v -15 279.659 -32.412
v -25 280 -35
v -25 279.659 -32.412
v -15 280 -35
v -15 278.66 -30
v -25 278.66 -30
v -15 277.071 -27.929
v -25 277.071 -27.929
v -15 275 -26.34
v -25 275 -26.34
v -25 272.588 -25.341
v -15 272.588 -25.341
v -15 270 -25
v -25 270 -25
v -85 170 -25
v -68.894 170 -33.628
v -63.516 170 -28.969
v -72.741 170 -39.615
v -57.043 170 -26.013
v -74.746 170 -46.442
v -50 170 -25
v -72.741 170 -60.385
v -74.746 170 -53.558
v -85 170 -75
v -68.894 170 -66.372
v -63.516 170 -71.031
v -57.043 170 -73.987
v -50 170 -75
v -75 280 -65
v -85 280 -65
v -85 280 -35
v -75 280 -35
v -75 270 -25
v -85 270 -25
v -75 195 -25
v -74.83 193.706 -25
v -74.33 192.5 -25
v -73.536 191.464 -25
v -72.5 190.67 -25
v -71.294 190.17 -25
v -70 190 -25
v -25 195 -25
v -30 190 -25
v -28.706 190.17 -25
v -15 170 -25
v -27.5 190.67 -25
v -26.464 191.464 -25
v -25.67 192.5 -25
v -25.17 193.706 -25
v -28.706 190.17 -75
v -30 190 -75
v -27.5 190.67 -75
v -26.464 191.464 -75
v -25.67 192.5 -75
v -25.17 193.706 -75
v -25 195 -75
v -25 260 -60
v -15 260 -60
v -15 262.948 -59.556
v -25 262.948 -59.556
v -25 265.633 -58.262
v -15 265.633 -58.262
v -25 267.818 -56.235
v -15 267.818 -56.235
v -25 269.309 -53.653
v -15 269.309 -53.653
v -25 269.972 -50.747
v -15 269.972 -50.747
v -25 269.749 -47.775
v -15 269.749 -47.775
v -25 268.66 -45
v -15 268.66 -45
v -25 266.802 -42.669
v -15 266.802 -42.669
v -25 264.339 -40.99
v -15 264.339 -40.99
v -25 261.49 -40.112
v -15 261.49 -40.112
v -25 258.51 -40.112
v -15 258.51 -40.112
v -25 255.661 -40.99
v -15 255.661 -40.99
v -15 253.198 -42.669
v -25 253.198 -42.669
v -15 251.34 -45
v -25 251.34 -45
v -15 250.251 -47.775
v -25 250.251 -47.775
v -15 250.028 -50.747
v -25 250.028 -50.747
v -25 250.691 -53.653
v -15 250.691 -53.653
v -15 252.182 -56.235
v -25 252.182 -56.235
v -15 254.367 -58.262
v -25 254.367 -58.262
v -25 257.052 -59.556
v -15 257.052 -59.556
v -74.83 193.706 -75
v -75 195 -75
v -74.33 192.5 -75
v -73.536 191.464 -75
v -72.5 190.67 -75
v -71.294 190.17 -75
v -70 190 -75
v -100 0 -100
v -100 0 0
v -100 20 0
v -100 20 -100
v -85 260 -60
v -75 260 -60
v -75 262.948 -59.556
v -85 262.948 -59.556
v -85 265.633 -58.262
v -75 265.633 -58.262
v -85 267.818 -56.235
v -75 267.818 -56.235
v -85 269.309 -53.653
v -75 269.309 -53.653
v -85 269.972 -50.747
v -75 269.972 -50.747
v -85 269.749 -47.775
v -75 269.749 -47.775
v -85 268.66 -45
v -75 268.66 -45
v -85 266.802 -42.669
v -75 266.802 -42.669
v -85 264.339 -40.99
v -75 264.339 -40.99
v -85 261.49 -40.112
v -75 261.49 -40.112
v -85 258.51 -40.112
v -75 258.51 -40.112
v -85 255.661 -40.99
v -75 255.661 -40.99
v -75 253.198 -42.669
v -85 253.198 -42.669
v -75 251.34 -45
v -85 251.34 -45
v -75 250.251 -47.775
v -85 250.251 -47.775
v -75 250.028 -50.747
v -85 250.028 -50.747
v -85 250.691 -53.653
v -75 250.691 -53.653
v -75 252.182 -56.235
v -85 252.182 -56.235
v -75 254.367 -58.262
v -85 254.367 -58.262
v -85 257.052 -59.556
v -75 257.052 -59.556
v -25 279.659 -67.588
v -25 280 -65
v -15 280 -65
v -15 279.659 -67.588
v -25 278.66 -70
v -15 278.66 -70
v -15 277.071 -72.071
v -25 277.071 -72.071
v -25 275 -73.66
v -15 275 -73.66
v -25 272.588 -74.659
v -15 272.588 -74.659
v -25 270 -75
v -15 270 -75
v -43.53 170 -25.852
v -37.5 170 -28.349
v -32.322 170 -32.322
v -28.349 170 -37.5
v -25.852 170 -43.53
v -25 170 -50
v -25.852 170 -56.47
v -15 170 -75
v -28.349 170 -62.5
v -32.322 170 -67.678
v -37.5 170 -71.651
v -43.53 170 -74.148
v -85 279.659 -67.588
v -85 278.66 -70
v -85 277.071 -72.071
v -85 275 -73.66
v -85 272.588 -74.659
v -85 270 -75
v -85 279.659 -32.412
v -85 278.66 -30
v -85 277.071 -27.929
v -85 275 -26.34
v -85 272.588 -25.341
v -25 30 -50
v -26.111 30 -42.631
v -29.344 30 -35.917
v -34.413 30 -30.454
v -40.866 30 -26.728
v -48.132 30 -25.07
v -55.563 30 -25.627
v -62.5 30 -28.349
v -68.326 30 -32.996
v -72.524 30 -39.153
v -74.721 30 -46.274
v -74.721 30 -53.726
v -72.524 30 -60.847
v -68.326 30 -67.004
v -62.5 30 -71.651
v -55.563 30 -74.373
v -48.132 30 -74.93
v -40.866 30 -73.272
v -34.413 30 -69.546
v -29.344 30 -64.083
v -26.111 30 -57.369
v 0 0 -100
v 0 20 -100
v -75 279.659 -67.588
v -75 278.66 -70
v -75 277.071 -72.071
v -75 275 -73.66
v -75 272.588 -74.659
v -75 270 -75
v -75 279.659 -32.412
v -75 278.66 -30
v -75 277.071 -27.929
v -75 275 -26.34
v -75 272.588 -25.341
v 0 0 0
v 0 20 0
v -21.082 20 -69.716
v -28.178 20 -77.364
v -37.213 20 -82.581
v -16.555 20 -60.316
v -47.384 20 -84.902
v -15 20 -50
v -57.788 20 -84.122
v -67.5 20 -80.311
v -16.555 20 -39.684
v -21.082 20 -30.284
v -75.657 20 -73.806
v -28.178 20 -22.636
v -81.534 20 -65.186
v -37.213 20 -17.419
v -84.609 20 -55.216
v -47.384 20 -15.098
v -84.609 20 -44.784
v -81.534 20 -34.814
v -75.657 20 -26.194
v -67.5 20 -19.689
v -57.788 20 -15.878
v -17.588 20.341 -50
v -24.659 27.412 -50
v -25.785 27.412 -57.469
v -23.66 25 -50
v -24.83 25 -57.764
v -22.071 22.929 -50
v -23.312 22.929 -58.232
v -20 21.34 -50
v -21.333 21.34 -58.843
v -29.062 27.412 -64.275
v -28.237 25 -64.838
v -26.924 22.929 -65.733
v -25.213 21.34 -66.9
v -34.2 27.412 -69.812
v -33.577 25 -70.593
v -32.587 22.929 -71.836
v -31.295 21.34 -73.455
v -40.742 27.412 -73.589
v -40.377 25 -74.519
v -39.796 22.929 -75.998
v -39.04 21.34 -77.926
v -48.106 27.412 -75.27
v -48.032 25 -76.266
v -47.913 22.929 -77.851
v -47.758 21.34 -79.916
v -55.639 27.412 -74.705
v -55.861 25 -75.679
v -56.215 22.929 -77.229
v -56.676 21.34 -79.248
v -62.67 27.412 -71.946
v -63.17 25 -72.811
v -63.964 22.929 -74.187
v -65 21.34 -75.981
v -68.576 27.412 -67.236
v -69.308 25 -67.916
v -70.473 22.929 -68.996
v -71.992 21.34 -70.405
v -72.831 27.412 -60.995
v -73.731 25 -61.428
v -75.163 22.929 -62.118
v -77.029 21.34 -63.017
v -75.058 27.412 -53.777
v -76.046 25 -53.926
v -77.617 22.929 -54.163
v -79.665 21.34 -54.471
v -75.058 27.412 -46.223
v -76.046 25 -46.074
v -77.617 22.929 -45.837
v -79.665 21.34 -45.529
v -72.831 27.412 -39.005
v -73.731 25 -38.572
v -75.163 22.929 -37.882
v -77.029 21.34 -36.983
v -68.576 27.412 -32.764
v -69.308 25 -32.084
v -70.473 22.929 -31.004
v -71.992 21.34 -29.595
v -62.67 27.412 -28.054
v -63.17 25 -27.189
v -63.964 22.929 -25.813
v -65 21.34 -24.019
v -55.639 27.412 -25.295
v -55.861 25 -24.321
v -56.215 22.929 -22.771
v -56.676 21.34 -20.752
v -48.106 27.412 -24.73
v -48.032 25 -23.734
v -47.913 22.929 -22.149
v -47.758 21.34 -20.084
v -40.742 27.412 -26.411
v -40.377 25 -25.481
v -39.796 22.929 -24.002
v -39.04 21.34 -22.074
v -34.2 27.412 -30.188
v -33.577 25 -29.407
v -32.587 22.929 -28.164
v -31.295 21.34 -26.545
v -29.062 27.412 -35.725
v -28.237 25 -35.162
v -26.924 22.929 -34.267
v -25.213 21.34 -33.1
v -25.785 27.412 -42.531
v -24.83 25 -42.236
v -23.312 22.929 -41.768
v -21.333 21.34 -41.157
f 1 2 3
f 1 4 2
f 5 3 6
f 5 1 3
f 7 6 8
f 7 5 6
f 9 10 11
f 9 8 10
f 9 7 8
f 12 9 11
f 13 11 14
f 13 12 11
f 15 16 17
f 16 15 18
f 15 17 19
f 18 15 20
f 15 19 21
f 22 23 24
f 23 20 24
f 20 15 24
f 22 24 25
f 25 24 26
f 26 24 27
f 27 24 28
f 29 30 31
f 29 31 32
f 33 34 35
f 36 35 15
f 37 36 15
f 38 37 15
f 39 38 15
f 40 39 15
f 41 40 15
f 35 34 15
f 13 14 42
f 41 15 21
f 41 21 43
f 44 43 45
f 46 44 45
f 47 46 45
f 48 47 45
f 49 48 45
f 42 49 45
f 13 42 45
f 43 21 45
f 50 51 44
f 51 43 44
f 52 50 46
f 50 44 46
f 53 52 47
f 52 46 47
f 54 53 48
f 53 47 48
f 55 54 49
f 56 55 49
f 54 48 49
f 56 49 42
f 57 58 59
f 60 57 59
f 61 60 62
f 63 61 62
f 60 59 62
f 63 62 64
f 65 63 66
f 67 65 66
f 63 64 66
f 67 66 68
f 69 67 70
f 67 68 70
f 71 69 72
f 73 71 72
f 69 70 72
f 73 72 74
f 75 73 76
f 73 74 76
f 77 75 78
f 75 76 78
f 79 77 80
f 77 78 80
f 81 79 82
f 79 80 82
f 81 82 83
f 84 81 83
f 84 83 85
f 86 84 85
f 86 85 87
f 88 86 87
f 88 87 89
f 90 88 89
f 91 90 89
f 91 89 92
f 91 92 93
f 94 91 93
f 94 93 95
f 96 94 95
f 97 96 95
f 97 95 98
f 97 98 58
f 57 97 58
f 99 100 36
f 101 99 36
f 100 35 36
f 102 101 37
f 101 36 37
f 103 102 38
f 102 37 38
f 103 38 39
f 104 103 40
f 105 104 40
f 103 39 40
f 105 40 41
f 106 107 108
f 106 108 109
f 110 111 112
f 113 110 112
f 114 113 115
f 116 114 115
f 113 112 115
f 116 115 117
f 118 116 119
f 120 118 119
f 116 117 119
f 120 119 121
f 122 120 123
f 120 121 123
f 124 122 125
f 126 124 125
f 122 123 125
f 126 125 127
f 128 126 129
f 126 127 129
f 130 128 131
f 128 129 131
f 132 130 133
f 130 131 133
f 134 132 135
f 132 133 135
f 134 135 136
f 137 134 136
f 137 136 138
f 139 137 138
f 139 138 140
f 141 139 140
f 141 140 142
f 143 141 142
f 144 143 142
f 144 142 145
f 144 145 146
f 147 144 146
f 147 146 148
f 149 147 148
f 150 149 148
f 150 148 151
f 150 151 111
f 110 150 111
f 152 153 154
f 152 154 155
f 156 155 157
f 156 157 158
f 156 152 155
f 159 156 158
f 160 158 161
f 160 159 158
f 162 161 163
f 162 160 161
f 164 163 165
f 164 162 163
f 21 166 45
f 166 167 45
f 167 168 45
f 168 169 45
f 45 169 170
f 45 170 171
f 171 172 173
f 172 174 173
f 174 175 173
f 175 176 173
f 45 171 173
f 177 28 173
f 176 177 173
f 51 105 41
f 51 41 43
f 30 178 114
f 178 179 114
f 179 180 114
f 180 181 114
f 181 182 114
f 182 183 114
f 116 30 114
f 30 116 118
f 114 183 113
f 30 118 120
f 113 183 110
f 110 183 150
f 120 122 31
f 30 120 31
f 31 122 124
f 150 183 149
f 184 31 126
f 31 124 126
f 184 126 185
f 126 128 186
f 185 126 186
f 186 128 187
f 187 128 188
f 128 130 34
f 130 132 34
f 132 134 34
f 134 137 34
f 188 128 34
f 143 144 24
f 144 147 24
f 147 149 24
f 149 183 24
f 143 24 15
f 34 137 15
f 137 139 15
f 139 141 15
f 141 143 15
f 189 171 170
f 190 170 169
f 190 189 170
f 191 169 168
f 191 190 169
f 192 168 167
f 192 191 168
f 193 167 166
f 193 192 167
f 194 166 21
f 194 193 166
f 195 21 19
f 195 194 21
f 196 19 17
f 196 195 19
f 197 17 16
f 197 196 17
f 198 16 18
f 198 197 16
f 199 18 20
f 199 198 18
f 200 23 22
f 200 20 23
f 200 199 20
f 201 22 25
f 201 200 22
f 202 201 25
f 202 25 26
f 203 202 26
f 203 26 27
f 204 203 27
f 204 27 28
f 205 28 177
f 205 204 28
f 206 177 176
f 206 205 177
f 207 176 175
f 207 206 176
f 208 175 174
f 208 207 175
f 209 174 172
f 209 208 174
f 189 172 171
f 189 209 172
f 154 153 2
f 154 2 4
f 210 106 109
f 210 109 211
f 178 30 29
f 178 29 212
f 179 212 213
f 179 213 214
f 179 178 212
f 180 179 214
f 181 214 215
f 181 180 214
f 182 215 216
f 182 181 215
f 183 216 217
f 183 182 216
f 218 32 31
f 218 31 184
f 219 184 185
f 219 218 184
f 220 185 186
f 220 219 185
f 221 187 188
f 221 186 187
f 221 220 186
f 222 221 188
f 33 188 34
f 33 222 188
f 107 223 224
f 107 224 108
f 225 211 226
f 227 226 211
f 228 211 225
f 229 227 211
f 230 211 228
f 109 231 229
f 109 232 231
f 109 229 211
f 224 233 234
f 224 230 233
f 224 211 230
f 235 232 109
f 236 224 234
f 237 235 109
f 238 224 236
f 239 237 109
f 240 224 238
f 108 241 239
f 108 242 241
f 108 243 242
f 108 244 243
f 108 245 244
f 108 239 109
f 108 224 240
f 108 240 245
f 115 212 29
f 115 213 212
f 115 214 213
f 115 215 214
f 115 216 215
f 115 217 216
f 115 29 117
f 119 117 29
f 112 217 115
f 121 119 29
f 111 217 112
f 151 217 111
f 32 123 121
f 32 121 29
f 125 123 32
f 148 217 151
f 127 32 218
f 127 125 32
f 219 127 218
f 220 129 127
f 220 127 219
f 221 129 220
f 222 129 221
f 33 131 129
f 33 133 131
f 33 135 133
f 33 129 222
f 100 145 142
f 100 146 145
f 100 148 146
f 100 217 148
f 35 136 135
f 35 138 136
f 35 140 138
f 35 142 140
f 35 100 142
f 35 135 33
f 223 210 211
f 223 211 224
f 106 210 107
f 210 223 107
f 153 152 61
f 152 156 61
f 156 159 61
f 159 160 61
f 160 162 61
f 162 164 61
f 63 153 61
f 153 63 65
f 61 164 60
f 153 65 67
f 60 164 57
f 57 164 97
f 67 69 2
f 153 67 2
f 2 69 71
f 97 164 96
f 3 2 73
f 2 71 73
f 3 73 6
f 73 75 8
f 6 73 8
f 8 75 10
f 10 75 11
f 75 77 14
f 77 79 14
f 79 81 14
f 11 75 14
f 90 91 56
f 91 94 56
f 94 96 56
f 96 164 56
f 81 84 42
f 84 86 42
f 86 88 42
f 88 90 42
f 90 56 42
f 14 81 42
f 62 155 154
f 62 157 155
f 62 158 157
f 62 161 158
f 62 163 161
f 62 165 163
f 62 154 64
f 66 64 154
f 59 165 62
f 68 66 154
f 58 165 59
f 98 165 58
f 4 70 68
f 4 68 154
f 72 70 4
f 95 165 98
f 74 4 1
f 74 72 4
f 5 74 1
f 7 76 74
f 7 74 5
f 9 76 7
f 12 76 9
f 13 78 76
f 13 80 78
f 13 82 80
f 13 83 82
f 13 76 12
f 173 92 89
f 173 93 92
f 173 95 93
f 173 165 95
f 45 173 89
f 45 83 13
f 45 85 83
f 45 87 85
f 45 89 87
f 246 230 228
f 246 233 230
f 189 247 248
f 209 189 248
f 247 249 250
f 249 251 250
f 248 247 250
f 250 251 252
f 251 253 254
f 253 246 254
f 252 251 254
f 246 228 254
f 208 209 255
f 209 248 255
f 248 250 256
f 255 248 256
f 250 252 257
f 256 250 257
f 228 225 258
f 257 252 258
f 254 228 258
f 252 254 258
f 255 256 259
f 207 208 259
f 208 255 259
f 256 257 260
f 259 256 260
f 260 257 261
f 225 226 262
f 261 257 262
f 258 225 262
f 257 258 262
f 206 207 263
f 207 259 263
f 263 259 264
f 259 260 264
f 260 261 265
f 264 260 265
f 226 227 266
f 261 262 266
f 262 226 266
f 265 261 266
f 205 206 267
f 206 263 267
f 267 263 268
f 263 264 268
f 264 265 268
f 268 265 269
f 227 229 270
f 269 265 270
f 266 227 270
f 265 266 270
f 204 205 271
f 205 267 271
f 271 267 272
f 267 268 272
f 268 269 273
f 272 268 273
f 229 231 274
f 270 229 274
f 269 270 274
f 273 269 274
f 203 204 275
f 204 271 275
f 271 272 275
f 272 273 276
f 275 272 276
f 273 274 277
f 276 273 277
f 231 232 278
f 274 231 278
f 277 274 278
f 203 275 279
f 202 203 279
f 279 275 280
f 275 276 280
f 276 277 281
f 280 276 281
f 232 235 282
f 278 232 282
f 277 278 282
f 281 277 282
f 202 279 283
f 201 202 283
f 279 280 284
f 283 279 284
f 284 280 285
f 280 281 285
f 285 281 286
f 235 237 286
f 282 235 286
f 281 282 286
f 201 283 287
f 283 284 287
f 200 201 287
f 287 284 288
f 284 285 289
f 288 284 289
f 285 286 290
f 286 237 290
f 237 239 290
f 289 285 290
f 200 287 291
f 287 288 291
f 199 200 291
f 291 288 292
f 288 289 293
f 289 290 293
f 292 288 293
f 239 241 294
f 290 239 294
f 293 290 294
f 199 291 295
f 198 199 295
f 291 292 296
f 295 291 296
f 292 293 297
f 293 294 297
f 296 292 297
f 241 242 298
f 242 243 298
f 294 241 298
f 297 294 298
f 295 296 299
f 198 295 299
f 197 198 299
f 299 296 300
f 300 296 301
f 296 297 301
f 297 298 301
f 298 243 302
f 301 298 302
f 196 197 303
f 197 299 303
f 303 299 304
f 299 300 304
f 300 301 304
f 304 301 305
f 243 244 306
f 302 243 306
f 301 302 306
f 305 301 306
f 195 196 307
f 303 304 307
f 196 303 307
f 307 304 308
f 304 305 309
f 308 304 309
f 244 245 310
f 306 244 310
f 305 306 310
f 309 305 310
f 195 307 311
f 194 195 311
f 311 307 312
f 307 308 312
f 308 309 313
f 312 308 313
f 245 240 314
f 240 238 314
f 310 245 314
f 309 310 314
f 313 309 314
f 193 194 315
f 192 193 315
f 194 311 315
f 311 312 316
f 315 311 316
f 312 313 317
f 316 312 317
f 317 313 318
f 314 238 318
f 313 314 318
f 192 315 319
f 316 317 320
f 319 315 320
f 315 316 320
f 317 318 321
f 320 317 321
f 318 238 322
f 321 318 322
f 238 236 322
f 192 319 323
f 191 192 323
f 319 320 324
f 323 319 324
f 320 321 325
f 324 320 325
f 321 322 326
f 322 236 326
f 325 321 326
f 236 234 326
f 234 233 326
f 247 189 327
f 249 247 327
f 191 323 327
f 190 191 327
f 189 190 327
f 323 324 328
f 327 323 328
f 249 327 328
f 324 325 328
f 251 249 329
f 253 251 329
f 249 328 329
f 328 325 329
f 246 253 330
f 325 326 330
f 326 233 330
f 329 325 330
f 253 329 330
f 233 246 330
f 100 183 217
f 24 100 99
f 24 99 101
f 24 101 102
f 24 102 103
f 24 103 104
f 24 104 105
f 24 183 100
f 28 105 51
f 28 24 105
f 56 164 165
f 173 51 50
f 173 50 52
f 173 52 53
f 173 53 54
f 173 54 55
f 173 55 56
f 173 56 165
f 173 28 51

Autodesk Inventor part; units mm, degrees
ref_plane "YZ Plane" through (0, 0, 0) normal (1, 0, 0) x (0, 1, 0)
ref_plane "XZ Plane" through (0, 0, 0) normal (0, 1, 0) x (-1, 0, 0)
ref_plane "XY Plane" through (0, 0, 0) normal (0, 0, 1) x (1, 0, 0)
sketch "Sketch1" plane through (0, 0, 0) normal (0, 1, 0) x (-1, 0, 0)
  line L0 (0, 0) -> (100, 0)
  line L1 (100, 0) -> (100, -100)
  line L2 (100, -100) -> (0, -100)
  line L3 (0, -100) -> (0, 0)
  dimension "d0" = 100
  dimension "d1" = 100
  dimension "d2" = 100
extrude "Extrusion1" add sketch "Sketch1" along normal blind 20
sketch "Sketch2" plane through (0, 20, 0) normal (0, 1, 0) x (1, 0, 0)
  line L0 (-100, 100) -> (-100, 0) projected
  line L1 (0, 100) -> (-100, 100) projected
  line L2 (-100, 0) -> (0, 0) projected
  circle A0 centre (-50, 50) radius 25
  dimension "d5" = 50
extrude "Extrusion2" add sketch "Sketch2" along normal blind 150
sketch "Sketch3" plane through (-50, 170, -50) normal (0, 1, 0) x (1, 0, 0)
  circle A0 centre (0, 0) radius 25 projected
  line L0 (0, 25) -> (35, 25)
  line L1 (35, 25) -> (35, -25)
  line L2 (0, 25) -> (-35, 25)
  line L3 (-35, 25) -> (-35, -25)
  line L4 (-35, -25) -> (35, -25)
  point P0 (50, -50)
  dimension "d12" = 35
  dimension "d13" = 35
extrude "Extrusion3" add sketch "Sketch3" along normal blind 20
sketch "Sketch4" plane through (-50, 190, -50) normal (0, 1, 0) x (1, 0, 0)
  line L0 (0, 25) -> (-35, 25) projected
  line L1 (-35, 25) -> (-25, 25)
  line L2 (-25, 25) -> (-25, -25)
  line L3 (-35, -25) -> (0, -25) projected
  line L4 (-35, -25) -> (-35, 25)
  line L5 (35, 25) -> (0, 25) projected
  line L6 (35, 25) -> (25, 25)
  line L7 (25, 25) -> (25, -25)
  line L8 (0, -25) -> (35, -25) projected
  line L9 (35, -25) -> (35, 25)
  point P0 (50, -50)
  dimension "d14" = 10
  dimension "d15" = 10
extrude "Extrusion4" add sketch "Sketch4" along normal blind 90 contours L2 L3 L4 L0 | L5 L9 L8 L7
sketch "Sketch5" plane through (-75, 190, -25) normal (1, 0, 0) x (0, 0, -1)
  line L0 (50, 0) -> (50, 90) projected
  line L1 (0, -20) -> (0, 90) projected
  circle A0 centre (25, 70) radius 10
  line L2 (50, 90) -> (0, 90) projected
  point P0 (-25, -190)
  dimension "d20" = 20
sketch "Sketch6" plane through (-15, 170, -25) normal (1, 0, 0) x (0, 0, -1)
  line L0 (50, 20) -> (50, 110) projected
  line L1 (50, 110) -> (50, 70)
  circle A0 centre (25, 90) radius 10
  line L2 (0, 110) -> (50, 110) projected
  point P0 (-25, -170)
  dimension "d23" = 20
extrude "Extrusion5" cut sketch "Sketch6" against normal blind 10
extrude "Extrusion6" cut sketch "Sketch5" against normal blind 10
fillet "Fillet1" radius 5 2 edges at (-25, 190, -50) (-75, 190, -50)
fillet "Fillet2" radius 10 4 edges at (-20, 280, -25) (-20, 280, -75) (-80, 280, -75) (-80, 280, -25)
fillet "Fillet3" radius 10 1 edges at (-75, 20, -50)
properties part number "wheel connector" material "Stainless Steel"
